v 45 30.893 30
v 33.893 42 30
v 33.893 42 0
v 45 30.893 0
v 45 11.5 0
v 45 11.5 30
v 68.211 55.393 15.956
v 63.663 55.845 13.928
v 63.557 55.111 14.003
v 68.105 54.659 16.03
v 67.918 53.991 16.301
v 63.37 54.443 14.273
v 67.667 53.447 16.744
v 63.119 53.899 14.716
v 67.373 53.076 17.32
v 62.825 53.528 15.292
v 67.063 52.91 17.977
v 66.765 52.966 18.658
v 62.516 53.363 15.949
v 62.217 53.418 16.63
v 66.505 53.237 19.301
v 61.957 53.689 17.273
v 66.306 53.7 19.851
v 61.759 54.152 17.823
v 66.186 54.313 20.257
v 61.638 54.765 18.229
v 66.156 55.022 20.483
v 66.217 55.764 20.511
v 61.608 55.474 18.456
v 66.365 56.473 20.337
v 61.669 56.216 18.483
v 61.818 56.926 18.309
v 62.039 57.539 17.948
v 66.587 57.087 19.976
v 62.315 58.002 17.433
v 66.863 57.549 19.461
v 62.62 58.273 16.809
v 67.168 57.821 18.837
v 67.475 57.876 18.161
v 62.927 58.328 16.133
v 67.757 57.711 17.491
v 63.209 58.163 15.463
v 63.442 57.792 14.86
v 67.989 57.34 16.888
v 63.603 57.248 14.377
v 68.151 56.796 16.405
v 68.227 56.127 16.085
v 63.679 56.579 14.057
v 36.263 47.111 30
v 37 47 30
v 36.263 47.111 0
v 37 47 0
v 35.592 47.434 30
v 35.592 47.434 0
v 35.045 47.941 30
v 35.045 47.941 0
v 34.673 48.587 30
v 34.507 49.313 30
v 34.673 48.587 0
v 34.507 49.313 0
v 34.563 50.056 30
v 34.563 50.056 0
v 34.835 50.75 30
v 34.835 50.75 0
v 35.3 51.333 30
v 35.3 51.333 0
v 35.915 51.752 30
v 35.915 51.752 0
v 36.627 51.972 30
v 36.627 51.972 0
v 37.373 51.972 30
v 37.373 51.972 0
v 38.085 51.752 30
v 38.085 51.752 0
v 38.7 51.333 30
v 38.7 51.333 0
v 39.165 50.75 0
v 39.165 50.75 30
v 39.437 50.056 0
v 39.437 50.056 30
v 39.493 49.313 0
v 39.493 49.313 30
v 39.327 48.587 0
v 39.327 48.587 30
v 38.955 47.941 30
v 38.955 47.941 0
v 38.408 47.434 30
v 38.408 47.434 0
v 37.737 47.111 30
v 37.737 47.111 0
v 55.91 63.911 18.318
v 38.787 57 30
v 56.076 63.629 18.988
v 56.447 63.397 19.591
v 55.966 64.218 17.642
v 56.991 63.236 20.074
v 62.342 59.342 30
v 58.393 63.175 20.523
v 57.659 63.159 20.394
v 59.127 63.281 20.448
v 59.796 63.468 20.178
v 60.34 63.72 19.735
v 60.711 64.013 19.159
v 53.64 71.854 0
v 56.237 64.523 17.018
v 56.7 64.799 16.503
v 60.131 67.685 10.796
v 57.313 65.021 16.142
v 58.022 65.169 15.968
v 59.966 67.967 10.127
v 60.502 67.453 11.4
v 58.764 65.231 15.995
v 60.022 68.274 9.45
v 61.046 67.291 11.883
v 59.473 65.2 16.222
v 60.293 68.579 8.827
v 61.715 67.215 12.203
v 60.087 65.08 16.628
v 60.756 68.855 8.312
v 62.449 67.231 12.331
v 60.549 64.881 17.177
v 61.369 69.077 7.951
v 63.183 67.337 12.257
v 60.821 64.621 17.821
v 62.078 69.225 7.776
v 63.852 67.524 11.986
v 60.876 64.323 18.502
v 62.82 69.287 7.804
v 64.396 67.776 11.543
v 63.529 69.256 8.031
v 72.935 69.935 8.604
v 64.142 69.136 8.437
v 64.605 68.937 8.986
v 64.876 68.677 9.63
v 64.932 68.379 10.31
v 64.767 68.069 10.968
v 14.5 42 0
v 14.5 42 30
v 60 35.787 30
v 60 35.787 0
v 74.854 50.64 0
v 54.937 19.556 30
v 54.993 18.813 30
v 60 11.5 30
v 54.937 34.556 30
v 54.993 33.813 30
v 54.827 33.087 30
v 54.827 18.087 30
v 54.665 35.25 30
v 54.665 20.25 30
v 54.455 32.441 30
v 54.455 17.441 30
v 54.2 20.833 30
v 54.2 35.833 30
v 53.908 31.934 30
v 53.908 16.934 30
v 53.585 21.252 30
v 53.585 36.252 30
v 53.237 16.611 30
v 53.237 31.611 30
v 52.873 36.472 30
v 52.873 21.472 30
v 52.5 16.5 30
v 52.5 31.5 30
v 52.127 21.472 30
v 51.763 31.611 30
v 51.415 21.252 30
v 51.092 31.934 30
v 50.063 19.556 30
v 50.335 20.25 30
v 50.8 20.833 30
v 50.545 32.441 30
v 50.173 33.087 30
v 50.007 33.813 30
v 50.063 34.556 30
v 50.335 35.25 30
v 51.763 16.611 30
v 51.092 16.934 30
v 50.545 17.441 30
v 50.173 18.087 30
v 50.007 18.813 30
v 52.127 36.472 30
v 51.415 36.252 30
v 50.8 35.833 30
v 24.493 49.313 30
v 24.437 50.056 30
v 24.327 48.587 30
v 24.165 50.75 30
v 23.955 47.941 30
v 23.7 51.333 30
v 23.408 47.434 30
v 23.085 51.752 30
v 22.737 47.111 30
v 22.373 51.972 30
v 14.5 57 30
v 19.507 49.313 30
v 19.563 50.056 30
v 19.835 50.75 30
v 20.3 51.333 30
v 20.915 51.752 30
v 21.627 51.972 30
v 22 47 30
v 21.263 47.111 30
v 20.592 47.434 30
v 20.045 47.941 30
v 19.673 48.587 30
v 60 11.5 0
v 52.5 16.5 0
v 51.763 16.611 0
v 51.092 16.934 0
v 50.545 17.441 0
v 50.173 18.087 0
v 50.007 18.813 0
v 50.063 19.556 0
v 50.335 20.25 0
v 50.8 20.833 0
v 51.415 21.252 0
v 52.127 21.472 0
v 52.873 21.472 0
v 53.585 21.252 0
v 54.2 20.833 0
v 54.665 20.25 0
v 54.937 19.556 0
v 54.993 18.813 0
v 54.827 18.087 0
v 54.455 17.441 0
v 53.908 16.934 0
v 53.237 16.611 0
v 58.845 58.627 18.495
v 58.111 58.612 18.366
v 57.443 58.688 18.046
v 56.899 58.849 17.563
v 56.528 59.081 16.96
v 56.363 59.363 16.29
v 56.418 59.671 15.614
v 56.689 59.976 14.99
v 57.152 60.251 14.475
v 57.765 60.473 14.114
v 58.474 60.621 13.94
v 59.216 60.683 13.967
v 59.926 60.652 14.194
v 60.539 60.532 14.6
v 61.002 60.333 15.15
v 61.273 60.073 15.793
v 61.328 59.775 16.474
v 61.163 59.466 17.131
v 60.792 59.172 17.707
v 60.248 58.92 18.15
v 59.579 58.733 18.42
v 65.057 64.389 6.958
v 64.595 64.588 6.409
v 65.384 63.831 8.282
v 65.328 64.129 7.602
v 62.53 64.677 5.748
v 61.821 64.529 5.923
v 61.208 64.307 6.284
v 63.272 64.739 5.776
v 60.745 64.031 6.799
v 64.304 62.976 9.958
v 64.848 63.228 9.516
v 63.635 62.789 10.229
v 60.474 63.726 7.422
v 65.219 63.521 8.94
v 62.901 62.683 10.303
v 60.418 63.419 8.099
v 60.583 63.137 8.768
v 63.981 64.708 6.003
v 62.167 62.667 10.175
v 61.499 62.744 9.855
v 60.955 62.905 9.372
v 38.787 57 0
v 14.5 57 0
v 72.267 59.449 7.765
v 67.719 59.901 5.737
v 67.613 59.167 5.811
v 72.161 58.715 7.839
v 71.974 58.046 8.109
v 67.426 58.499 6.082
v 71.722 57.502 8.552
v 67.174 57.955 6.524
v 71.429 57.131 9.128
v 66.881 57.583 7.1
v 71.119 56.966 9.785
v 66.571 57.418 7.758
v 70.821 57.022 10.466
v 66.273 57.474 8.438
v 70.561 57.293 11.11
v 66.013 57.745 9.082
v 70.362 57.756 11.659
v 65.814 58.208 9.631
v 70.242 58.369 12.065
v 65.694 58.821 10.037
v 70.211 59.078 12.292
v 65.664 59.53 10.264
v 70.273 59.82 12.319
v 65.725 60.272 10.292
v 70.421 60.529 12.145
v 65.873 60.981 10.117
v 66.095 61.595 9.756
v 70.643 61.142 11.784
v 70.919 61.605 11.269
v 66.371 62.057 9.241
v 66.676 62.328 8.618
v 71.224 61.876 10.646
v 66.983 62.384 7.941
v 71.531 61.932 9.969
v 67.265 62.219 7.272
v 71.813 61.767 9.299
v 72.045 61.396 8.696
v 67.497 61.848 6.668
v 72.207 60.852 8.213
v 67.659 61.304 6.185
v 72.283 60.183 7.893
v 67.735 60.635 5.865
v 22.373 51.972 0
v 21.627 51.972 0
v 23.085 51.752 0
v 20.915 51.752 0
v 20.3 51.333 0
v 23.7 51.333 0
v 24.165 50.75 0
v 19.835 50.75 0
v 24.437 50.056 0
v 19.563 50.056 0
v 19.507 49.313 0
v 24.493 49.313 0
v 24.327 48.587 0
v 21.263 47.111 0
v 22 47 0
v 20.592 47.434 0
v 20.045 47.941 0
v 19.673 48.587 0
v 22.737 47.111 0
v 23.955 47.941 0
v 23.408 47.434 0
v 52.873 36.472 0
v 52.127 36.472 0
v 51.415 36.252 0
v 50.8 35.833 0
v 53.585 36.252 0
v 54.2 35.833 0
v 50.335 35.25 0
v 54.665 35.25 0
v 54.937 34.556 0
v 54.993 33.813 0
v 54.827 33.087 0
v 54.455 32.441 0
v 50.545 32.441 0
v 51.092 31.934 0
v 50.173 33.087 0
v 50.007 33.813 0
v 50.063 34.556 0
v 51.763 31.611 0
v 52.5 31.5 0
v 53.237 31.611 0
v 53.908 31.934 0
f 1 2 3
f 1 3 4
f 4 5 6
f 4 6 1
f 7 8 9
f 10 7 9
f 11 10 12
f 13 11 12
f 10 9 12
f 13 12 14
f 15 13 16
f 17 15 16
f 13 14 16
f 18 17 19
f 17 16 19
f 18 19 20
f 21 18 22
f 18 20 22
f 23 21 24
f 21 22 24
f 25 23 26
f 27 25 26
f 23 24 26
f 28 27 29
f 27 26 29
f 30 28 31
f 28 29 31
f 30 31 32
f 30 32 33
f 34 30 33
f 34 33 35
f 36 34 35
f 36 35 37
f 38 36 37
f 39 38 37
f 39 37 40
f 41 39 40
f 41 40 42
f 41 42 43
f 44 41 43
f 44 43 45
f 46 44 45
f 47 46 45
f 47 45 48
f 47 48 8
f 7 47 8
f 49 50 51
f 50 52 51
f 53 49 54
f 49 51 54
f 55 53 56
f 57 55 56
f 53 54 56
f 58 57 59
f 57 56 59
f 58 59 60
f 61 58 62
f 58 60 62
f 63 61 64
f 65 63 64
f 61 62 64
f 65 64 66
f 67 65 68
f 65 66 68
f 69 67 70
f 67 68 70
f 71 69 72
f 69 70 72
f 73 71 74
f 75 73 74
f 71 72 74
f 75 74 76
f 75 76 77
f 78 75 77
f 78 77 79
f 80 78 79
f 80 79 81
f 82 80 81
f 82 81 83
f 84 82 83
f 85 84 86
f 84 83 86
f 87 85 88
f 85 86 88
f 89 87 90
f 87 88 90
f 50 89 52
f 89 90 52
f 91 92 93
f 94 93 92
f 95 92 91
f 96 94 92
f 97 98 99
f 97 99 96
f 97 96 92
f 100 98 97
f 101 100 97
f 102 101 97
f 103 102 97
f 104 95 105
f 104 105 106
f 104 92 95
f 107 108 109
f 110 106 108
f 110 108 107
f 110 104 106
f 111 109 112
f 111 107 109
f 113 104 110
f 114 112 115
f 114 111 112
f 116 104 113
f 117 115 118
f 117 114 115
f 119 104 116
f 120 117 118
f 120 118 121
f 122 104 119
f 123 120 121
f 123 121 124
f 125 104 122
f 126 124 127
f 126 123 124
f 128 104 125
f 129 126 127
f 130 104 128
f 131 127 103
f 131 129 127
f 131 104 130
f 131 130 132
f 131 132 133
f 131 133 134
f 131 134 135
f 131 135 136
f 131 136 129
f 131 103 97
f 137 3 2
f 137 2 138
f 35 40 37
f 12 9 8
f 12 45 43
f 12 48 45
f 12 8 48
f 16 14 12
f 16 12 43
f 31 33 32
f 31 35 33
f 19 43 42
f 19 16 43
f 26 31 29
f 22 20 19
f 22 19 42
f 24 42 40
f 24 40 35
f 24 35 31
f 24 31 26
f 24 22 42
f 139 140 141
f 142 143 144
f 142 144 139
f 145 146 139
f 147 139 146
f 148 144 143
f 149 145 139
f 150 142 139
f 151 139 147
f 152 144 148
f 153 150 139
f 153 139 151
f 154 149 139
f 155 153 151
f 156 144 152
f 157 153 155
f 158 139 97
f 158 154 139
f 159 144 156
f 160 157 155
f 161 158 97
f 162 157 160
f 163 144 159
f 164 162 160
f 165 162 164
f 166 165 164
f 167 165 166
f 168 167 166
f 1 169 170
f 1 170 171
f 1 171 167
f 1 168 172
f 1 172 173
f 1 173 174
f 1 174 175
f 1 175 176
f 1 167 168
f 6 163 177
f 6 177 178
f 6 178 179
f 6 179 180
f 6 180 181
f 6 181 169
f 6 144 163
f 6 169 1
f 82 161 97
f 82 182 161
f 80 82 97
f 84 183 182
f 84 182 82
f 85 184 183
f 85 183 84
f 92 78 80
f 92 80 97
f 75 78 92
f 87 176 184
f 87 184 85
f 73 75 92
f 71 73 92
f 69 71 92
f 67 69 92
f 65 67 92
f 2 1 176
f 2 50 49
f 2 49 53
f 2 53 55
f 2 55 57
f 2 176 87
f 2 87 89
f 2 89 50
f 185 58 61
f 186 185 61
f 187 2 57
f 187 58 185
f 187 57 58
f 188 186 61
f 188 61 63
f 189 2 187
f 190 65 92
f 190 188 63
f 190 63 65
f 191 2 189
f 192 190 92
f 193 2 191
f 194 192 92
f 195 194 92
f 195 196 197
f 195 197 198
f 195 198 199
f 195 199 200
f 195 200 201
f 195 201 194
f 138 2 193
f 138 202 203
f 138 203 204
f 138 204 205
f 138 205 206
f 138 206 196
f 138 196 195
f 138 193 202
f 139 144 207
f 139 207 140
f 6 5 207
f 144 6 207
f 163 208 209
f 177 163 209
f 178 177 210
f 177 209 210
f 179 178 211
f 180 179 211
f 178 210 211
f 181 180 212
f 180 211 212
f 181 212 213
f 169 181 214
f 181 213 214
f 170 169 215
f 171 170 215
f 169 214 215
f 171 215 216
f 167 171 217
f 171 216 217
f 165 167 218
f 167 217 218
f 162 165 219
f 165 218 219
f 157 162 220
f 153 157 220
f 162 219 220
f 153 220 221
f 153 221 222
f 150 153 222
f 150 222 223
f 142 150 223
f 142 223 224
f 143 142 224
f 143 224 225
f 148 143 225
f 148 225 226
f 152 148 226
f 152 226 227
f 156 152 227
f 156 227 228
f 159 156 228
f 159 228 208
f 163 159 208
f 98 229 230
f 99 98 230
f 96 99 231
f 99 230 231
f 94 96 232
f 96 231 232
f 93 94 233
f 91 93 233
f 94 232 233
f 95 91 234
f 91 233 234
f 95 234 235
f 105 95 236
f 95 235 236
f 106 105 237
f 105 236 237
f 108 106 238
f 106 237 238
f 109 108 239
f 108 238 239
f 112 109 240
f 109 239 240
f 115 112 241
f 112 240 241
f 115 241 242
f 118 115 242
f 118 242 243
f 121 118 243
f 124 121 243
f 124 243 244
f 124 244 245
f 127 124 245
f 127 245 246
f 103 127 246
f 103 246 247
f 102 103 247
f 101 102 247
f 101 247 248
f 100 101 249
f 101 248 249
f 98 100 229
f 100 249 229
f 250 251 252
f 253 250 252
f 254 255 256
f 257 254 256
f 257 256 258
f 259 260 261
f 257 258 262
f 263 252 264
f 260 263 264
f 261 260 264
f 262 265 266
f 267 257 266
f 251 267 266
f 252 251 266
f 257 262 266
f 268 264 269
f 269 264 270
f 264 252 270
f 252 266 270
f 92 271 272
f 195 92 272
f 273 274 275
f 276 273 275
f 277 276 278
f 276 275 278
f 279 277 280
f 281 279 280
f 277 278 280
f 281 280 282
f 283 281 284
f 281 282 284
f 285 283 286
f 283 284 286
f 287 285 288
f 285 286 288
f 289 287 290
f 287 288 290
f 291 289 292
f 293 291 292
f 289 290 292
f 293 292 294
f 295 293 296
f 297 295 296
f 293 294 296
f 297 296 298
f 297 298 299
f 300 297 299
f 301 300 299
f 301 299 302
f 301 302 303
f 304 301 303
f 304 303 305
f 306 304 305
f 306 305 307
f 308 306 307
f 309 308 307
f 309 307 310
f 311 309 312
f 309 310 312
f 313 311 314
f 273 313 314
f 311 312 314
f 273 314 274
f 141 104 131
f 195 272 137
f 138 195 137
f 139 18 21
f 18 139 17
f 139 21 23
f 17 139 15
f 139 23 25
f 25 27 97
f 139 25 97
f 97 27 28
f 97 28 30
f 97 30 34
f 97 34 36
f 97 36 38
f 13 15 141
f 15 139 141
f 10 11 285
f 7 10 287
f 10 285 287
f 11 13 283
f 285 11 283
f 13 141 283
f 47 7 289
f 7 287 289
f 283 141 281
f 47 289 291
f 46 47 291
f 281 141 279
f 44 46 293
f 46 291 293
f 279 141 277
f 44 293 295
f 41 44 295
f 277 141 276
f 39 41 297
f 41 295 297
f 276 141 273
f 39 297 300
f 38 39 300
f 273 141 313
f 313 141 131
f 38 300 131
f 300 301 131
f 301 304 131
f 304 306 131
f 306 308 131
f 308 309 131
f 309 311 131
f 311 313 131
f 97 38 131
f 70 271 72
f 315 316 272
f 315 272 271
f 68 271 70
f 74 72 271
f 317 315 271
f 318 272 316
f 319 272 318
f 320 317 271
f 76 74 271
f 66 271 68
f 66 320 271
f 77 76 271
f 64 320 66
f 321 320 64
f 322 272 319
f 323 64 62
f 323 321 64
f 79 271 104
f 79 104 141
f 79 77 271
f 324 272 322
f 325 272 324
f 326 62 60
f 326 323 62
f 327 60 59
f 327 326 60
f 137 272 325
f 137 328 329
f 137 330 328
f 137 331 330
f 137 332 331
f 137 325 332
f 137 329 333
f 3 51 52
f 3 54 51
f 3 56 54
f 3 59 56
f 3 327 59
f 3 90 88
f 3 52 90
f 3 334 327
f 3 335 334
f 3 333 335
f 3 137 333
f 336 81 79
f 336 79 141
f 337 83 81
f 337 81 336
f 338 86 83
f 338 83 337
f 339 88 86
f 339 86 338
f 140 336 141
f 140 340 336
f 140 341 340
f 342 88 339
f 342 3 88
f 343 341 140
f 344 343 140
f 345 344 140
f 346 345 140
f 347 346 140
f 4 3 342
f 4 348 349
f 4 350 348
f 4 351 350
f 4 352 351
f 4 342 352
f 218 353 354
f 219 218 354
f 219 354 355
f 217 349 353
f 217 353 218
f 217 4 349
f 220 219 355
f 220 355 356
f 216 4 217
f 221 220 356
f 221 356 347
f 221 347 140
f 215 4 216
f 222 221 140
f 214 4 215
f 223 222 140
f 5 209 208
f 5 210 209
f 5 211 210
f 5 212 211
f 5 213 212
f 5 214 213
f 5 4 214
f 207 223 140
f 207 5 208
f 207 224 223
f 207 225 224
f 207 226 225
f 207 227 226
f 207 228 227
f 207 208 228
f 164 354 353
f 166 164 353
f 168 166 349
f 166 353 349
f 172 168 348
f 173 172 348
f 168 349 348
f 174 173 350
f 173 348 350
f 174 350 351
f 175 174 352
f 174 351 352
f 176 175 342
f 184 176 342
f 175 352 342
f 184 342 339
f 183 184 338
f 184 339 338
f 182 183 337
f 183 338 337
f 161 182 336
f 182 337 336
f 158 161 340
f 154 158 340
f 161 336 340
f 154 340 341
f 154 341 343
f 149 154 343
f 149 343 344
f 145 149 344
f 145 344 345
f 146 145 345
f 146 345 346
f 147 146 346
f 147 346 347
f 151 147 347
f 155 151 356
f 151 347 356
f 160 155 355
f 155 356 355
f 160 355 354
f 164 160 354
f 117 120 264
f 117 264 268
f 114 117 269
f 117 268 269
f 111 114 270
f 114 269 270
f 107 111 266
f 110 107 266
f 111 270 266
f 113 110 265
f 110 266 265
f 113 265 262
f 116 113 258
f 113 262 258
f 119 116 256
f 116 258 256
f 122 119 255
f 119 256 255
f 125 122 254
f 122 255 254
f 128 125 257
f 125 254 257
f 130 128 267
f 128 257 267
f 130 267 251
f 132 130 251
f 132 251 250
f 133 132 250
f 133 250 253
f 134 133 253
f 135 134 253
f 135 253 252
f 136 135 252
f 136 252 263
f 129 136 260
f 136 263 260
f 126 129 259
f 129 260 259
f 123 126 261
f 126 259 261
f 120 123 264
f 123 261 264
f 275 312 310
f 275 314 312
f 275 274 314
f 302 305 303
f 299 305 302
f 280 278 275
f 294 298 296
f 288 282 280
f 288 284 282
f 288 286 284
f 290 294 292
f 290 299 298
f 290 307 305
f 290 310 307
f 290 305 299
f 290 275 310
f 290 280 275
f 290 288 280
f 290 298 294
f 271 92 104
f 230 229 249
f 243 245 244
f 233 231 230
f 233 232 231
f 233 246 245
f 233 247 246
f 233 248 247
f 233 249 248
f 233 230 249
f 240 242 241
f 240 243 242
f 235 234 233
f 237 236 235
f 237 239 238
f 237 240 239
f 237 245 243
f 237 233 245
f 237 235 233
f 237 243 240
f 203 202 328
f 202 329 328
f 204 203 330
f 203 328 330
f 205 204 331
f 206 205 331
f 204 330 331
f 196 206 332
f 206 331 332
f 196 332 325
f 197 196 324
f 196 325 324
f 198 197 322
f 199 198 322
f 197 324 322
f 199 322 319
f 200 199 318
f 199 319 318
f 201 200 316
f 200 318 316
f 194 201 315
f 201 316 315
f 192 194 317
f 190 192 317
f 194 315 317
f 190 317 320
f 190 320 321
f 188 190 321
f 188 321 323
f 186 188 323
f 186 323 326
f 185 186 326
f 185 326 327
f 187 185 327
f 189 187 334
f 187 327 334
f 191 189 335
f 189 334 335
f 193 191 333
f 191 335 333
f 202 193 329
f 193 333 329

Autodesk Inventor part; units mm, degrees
ref_plane "YZ Plane" through (0, 0, 0) normal (1, 0, 0) x (0, 1, 0)
ref_plane "XZ Plane" through (0, 0, 0) normal (0, 1, 0) x (-1, 0, 0)
ref_plane "XY Plane" through (0, 0, 0) normal (0, 0, 1) x (1, 0, 0)
sketch "スケッチ1" plane through (0, 0, 0) normal (0, 0, 1) x (1, 0, 0)
  line L0 (0, 0) -> (60, 0)
  line L1 (60, 0) -> (60, 60)
  line L2 (60, 60) -> (0, 60)
  line L3 (0, 60) -> (0, 0)
  dimension "d0" = 60
  dimension "d1" = 60
extrude "押し出し1" add sketch "スケッチ1" along normal blind 30
sketch "スケッチ2" plane through (0, 0, 30) normal (0, 0, 1) x (1, 0, 0)
  line L0 (60, 0) -> (60, 60) projected
  line L1 (60, 60) -> (0, 60) projected
  point P0 (0, 0)
  point P1 (22, 49.5)
  point P2 (37, 49.5)
  point P3 (52.5, 34)
  point P4 (52.5, 19)
  dimension "d4" = 7.5
  dimension "d5" = 7.5
  dimension "d6" = 10.5
  dimension "d7" = 10.5
  dimension "d8" = 15
  dimension "d9" = 15
  dimension "d10" = 23
  dimension "d11" = 26
hole "穴1" at (22, 49.5, 30) at (37, 49.5, 30) at (52.5, 34, 30) at (52.5, 19, 30) direction (0, 0, -1) diameter 5 end through all
sketch "スケッチ3" plane through (0, 0, 30) normal (0, 0, 1) x (1, 0, 0)
  line L0 (22, 49.5) -> (37, 49.5)
  circle A0 centre (52.5, 34) radius 2.5 projected
  line L1 (37, 49.5) -> (52.5, 34)
  line L2 (52.5, 34) -> (52.5, 19)
  line L3 (22, 49.5) -> (22, 19)
  line L4 (22, 19) -> (52.5, 19)
  line L5 (60, 37.1066) -> (40.1066, 57)
  line L6 (40.1066, 57) -> (14.5, 57)
  line L7 (14.5, 57) -> (14.5, 11.5)
  line L8 (14.5, 11.5) -> (60, 11.5)
  line L9 (60, 11.5) -> (60, 37.1066)
  line L10 (14.5, 57) -> (44.5, 57)
  line L11 (44.5, 57) -> (44.5, 42)
  line L12 (44.5, 42) -> (14.5, 42)
  line L13 (14.5, 42) -> (14.5, 57)
  line L14 (60, 11.5) -> (45, 11.5)
  line L15 (45, 11.5) -> (45, 41.5)
  line L16 (45, 41.5) -> (60, 41.5)
  line L17 (60, 41.5) -> (60, 11.5)
  circle A1 centre (52.5, 19) radius 2.5 projected
  circle A2 centre (52.5, 34) radius 2.5 projected
  circle A3 centre (37, 49.5) radius 2.5 projected
  circle A4 centre (22, 49.5) radius 2.5 projected
  line L18 (60, 0) -> (60, 60) projected
  line L19 (60, 60) -> (0, 60) projected
  line L20 (0, 60) -> (0, 0) projected
  line L21 (0, 0) -> (60, 0) projected
  line L22 (14.5, 42) -> (45, 11.5)
  line L23 (24.0029, 51.8905) -> (54.5029, 21.3905)
  line L24 (38.7868, 57) -> (60, 35.7868)
  point P0 (52.5, 26.5)
  point P1 (45, 19)
  point P2 (22, 42)
  point P3 (39.2529, 36.6405)
  point P4 (45, 30.8934)
  point P5 (33.8934, 42)
  dimension "d19" = 7.5
  dimension "d20" = 7.5
  dimension "d21" = 7.5
  dimension "d22" = 30
  dimension "d23" = 30
  dimension "d50" = 7.5
  dimension "d52" = 30
extrude "押し出し2" cut sketch "スケッチ3" against normal blind 30 contours L12 L23 L15 L4 L22 L3 | L3 L22 L12 | L22 L4 L3 | L3 L4 L22 L8 L7 | L7 L8 L18 L21 L20 L19 L16 L5 L11 L10 L6 | L4 L15 L22 | L24 L6 L5 L11 | L11 L5 L16 L24 | L16 L5 L9 L24 | L5 L10 L11 | L16 L17 L5
sketch "スケッチ15" plane through (60, 35.7868, 0) normal (0.7071068, 0.7071068, 0) x (-0.7071068, 0.7071068, 0)
  line L0 (0, 30) -> (30, 30) projected
  line L1 (0, 0) -> (0, 30) projected
  line L2 (30, 0) -> (0, 0) projected
  line L3 (30, 30) -> (30, 0) projected
  point P0 (17.1213, 0)
extrude "押し出し11" add sketch "スケッチ15" along normal blind 30
sketch "スケッチ16" plane through (60, 35.7868, 30) normal (0.7071068, -0.7071068, 0) x (-0.7071068, -0.7071068, 0)
  line L0 (0, 30) -> (0, 0) projected
  line L1 (0, 30) -> (-30, 30) projected
  line L2 (-30, 0) -> (-30, 30) projected
  line L3 (0, 0) -> (-30, 0) projected
  line L4 (0, 0) -> (-30.762, 43.9327)
  point P0 (67.7315, 30)
  point P1 (-21.0062, 30)
  dimension "d97" = 55
extrude "押し出し12" cut sketch "スケッチ16" against normal blind 30 contours L3 L2 L1 L4
sketch "スケッチ25" plane through (60, 35.7868, 30) normal (0.579228, 0.579228, 0.5735764) x (0.7071068, -0.7071068, 0)
  line L0 (0, 36.6232) -> (0, 0) projected
  line L1 (-30, 36.6232) -> (0, 36.6232) projected
  line L2 (-30, 0) -> (-30, 36.6232) projected
  line L3 (0, 0) -> (-30, 0) projected
  point P0 (-17.1213, -14.2746)
extrude "押し出し17" add sketch "スケッチ25" along normal blind 30
sketch "スケッチ26" plane through (74.8536, 50.6404, 0) normal (0.4055798, 0.4055798, -0.819152) x (-0.579228, -0.579228, -0.5735764)
  line L0 (0, 30) -> (0, 0) projected
  line L1 (0, 30) -> (-30, 30) projected
  line L2 (-30, 0) -> (-30, 30) projected
  line L3 (0, 0) -> (-30, 0) projected
  line L4 (0, 0) -> (-30, 30)
  line L5 (0, 30) -> (-30, 0)
  point P0 (72.6897, 17.1213)
  point P1 (-15, 15)
extrude "押し出し18" cut sketch "スケッチ26" against normal through all contours L5 L4 L1 | L3 L5 L4 | L4 L5 L2
sketch "スケッチ27" plane through (74.8536, 50.6404, 0) normal (0.909576, -0.090424, 0.4055798) x (0.4055798, 0.4055798, -0.819152)
  point P0 (-50.8979, -39.2928)
sketch "スケッチ28" plane through (0, 0, 30) normal (0, 0, 1) x (1, 0, 0)
  line L0 (3.3303, 1.5204) -> (87.3121, 1.5204)
  line L1 (87.3121, 1.5204) -> (87.3121, 89.4116)
  line L2 (87.3121, 89.4116) -> (3.3303, 89.4116)
  line L3 (3.3303, 89.4116) -> (3.3303, 1.5204)
  point P0 (0, 0)
extrude "押し出し19" cut sketch "スケッチ28" along normal blind 100
sketch "スケッチ29" plane through (74.8536, 50.6404, 0) normal (0.909576, -0.090424, 0.4055798) x (0.4055798, 0.4055798, -0.819152)
  line L0 (-36.6232, 21.2132) -> (-26.1201, 21.2132) projected
  line L1 (0, 21.2132) -> (0, 0) projected
  line L2 (-26.1201, 21.2132) -> (0, 21.2132)
  line L3 (0, 21.2132) -> (0, 0)
  line L4 (0, 0) -> (-26.1201, 0)
  line L5 (-26.1201, 0) -> (-26.1201, 21.2132)
  point P0 (-50.8979, -39.2928)
  point P1 (-16.1201, 12.4132)
  point P2 (-6.1201, 12.4132)
  dimension "d104" = 10
  dimension "d105" = 10
  dimension "d106" = 8.8
  dimension "d107" = 8.8
hole "穴4" at (67.1932, 55.3932, 18.2394) at (71.249, 59.449, 10.0479) direction (-0.909576, 0.090424, -0.4055798) diameter 5 depth 5
sketch "スケッチ30" plane through (53.6404, 71.8536, 0) normal (-0.090424, 0.909576, 0.4055798) x (0.909576, -0.090424, 0.4055798)
  line L0 (21.2132, 0) -> (21.2132, -26.1201) projected
  line L1 (-12.1674, -12.0487) -> (0, 0) projected
  line L2 (21.2132, -26.1201) -> (0, -26.1201)
  line L3 (0, -26.1201) -> (0, 0)
  line L4 (0, 0) -> (21.2132, 0)
  line L5 (21.2132, 0) -> (21.2132, -26.1201)
  point P0 (-42.2928, -50.8979)
  point P1 (12.4132, -16.1201)
  point P2 (12.4132, -6.1201)
  dimension "d115" = 10
  dimension "d116" = 10
  dimension "d117" = 8.8
  dimension "d118" = 8.8
hole "穴5" at (58.3932, 64.1932, 18.2394) at (62.449, 68.249, 10.0479) direction (0.090424, -0.909576, -0.4055798) diameter 5 depth 5
equation "\"d5\" = d4"
equation "\"d7\" = d6"
equation "\"d9\" = d8"
equation "\"d20\" = d19"
equation "\"d21\" = d20"
equation "\"d23\" = d22"
equation "\"d105\" = d104"
equation "\"d116\" = d115"
properties part number "EX-L-Connect-50deg"
